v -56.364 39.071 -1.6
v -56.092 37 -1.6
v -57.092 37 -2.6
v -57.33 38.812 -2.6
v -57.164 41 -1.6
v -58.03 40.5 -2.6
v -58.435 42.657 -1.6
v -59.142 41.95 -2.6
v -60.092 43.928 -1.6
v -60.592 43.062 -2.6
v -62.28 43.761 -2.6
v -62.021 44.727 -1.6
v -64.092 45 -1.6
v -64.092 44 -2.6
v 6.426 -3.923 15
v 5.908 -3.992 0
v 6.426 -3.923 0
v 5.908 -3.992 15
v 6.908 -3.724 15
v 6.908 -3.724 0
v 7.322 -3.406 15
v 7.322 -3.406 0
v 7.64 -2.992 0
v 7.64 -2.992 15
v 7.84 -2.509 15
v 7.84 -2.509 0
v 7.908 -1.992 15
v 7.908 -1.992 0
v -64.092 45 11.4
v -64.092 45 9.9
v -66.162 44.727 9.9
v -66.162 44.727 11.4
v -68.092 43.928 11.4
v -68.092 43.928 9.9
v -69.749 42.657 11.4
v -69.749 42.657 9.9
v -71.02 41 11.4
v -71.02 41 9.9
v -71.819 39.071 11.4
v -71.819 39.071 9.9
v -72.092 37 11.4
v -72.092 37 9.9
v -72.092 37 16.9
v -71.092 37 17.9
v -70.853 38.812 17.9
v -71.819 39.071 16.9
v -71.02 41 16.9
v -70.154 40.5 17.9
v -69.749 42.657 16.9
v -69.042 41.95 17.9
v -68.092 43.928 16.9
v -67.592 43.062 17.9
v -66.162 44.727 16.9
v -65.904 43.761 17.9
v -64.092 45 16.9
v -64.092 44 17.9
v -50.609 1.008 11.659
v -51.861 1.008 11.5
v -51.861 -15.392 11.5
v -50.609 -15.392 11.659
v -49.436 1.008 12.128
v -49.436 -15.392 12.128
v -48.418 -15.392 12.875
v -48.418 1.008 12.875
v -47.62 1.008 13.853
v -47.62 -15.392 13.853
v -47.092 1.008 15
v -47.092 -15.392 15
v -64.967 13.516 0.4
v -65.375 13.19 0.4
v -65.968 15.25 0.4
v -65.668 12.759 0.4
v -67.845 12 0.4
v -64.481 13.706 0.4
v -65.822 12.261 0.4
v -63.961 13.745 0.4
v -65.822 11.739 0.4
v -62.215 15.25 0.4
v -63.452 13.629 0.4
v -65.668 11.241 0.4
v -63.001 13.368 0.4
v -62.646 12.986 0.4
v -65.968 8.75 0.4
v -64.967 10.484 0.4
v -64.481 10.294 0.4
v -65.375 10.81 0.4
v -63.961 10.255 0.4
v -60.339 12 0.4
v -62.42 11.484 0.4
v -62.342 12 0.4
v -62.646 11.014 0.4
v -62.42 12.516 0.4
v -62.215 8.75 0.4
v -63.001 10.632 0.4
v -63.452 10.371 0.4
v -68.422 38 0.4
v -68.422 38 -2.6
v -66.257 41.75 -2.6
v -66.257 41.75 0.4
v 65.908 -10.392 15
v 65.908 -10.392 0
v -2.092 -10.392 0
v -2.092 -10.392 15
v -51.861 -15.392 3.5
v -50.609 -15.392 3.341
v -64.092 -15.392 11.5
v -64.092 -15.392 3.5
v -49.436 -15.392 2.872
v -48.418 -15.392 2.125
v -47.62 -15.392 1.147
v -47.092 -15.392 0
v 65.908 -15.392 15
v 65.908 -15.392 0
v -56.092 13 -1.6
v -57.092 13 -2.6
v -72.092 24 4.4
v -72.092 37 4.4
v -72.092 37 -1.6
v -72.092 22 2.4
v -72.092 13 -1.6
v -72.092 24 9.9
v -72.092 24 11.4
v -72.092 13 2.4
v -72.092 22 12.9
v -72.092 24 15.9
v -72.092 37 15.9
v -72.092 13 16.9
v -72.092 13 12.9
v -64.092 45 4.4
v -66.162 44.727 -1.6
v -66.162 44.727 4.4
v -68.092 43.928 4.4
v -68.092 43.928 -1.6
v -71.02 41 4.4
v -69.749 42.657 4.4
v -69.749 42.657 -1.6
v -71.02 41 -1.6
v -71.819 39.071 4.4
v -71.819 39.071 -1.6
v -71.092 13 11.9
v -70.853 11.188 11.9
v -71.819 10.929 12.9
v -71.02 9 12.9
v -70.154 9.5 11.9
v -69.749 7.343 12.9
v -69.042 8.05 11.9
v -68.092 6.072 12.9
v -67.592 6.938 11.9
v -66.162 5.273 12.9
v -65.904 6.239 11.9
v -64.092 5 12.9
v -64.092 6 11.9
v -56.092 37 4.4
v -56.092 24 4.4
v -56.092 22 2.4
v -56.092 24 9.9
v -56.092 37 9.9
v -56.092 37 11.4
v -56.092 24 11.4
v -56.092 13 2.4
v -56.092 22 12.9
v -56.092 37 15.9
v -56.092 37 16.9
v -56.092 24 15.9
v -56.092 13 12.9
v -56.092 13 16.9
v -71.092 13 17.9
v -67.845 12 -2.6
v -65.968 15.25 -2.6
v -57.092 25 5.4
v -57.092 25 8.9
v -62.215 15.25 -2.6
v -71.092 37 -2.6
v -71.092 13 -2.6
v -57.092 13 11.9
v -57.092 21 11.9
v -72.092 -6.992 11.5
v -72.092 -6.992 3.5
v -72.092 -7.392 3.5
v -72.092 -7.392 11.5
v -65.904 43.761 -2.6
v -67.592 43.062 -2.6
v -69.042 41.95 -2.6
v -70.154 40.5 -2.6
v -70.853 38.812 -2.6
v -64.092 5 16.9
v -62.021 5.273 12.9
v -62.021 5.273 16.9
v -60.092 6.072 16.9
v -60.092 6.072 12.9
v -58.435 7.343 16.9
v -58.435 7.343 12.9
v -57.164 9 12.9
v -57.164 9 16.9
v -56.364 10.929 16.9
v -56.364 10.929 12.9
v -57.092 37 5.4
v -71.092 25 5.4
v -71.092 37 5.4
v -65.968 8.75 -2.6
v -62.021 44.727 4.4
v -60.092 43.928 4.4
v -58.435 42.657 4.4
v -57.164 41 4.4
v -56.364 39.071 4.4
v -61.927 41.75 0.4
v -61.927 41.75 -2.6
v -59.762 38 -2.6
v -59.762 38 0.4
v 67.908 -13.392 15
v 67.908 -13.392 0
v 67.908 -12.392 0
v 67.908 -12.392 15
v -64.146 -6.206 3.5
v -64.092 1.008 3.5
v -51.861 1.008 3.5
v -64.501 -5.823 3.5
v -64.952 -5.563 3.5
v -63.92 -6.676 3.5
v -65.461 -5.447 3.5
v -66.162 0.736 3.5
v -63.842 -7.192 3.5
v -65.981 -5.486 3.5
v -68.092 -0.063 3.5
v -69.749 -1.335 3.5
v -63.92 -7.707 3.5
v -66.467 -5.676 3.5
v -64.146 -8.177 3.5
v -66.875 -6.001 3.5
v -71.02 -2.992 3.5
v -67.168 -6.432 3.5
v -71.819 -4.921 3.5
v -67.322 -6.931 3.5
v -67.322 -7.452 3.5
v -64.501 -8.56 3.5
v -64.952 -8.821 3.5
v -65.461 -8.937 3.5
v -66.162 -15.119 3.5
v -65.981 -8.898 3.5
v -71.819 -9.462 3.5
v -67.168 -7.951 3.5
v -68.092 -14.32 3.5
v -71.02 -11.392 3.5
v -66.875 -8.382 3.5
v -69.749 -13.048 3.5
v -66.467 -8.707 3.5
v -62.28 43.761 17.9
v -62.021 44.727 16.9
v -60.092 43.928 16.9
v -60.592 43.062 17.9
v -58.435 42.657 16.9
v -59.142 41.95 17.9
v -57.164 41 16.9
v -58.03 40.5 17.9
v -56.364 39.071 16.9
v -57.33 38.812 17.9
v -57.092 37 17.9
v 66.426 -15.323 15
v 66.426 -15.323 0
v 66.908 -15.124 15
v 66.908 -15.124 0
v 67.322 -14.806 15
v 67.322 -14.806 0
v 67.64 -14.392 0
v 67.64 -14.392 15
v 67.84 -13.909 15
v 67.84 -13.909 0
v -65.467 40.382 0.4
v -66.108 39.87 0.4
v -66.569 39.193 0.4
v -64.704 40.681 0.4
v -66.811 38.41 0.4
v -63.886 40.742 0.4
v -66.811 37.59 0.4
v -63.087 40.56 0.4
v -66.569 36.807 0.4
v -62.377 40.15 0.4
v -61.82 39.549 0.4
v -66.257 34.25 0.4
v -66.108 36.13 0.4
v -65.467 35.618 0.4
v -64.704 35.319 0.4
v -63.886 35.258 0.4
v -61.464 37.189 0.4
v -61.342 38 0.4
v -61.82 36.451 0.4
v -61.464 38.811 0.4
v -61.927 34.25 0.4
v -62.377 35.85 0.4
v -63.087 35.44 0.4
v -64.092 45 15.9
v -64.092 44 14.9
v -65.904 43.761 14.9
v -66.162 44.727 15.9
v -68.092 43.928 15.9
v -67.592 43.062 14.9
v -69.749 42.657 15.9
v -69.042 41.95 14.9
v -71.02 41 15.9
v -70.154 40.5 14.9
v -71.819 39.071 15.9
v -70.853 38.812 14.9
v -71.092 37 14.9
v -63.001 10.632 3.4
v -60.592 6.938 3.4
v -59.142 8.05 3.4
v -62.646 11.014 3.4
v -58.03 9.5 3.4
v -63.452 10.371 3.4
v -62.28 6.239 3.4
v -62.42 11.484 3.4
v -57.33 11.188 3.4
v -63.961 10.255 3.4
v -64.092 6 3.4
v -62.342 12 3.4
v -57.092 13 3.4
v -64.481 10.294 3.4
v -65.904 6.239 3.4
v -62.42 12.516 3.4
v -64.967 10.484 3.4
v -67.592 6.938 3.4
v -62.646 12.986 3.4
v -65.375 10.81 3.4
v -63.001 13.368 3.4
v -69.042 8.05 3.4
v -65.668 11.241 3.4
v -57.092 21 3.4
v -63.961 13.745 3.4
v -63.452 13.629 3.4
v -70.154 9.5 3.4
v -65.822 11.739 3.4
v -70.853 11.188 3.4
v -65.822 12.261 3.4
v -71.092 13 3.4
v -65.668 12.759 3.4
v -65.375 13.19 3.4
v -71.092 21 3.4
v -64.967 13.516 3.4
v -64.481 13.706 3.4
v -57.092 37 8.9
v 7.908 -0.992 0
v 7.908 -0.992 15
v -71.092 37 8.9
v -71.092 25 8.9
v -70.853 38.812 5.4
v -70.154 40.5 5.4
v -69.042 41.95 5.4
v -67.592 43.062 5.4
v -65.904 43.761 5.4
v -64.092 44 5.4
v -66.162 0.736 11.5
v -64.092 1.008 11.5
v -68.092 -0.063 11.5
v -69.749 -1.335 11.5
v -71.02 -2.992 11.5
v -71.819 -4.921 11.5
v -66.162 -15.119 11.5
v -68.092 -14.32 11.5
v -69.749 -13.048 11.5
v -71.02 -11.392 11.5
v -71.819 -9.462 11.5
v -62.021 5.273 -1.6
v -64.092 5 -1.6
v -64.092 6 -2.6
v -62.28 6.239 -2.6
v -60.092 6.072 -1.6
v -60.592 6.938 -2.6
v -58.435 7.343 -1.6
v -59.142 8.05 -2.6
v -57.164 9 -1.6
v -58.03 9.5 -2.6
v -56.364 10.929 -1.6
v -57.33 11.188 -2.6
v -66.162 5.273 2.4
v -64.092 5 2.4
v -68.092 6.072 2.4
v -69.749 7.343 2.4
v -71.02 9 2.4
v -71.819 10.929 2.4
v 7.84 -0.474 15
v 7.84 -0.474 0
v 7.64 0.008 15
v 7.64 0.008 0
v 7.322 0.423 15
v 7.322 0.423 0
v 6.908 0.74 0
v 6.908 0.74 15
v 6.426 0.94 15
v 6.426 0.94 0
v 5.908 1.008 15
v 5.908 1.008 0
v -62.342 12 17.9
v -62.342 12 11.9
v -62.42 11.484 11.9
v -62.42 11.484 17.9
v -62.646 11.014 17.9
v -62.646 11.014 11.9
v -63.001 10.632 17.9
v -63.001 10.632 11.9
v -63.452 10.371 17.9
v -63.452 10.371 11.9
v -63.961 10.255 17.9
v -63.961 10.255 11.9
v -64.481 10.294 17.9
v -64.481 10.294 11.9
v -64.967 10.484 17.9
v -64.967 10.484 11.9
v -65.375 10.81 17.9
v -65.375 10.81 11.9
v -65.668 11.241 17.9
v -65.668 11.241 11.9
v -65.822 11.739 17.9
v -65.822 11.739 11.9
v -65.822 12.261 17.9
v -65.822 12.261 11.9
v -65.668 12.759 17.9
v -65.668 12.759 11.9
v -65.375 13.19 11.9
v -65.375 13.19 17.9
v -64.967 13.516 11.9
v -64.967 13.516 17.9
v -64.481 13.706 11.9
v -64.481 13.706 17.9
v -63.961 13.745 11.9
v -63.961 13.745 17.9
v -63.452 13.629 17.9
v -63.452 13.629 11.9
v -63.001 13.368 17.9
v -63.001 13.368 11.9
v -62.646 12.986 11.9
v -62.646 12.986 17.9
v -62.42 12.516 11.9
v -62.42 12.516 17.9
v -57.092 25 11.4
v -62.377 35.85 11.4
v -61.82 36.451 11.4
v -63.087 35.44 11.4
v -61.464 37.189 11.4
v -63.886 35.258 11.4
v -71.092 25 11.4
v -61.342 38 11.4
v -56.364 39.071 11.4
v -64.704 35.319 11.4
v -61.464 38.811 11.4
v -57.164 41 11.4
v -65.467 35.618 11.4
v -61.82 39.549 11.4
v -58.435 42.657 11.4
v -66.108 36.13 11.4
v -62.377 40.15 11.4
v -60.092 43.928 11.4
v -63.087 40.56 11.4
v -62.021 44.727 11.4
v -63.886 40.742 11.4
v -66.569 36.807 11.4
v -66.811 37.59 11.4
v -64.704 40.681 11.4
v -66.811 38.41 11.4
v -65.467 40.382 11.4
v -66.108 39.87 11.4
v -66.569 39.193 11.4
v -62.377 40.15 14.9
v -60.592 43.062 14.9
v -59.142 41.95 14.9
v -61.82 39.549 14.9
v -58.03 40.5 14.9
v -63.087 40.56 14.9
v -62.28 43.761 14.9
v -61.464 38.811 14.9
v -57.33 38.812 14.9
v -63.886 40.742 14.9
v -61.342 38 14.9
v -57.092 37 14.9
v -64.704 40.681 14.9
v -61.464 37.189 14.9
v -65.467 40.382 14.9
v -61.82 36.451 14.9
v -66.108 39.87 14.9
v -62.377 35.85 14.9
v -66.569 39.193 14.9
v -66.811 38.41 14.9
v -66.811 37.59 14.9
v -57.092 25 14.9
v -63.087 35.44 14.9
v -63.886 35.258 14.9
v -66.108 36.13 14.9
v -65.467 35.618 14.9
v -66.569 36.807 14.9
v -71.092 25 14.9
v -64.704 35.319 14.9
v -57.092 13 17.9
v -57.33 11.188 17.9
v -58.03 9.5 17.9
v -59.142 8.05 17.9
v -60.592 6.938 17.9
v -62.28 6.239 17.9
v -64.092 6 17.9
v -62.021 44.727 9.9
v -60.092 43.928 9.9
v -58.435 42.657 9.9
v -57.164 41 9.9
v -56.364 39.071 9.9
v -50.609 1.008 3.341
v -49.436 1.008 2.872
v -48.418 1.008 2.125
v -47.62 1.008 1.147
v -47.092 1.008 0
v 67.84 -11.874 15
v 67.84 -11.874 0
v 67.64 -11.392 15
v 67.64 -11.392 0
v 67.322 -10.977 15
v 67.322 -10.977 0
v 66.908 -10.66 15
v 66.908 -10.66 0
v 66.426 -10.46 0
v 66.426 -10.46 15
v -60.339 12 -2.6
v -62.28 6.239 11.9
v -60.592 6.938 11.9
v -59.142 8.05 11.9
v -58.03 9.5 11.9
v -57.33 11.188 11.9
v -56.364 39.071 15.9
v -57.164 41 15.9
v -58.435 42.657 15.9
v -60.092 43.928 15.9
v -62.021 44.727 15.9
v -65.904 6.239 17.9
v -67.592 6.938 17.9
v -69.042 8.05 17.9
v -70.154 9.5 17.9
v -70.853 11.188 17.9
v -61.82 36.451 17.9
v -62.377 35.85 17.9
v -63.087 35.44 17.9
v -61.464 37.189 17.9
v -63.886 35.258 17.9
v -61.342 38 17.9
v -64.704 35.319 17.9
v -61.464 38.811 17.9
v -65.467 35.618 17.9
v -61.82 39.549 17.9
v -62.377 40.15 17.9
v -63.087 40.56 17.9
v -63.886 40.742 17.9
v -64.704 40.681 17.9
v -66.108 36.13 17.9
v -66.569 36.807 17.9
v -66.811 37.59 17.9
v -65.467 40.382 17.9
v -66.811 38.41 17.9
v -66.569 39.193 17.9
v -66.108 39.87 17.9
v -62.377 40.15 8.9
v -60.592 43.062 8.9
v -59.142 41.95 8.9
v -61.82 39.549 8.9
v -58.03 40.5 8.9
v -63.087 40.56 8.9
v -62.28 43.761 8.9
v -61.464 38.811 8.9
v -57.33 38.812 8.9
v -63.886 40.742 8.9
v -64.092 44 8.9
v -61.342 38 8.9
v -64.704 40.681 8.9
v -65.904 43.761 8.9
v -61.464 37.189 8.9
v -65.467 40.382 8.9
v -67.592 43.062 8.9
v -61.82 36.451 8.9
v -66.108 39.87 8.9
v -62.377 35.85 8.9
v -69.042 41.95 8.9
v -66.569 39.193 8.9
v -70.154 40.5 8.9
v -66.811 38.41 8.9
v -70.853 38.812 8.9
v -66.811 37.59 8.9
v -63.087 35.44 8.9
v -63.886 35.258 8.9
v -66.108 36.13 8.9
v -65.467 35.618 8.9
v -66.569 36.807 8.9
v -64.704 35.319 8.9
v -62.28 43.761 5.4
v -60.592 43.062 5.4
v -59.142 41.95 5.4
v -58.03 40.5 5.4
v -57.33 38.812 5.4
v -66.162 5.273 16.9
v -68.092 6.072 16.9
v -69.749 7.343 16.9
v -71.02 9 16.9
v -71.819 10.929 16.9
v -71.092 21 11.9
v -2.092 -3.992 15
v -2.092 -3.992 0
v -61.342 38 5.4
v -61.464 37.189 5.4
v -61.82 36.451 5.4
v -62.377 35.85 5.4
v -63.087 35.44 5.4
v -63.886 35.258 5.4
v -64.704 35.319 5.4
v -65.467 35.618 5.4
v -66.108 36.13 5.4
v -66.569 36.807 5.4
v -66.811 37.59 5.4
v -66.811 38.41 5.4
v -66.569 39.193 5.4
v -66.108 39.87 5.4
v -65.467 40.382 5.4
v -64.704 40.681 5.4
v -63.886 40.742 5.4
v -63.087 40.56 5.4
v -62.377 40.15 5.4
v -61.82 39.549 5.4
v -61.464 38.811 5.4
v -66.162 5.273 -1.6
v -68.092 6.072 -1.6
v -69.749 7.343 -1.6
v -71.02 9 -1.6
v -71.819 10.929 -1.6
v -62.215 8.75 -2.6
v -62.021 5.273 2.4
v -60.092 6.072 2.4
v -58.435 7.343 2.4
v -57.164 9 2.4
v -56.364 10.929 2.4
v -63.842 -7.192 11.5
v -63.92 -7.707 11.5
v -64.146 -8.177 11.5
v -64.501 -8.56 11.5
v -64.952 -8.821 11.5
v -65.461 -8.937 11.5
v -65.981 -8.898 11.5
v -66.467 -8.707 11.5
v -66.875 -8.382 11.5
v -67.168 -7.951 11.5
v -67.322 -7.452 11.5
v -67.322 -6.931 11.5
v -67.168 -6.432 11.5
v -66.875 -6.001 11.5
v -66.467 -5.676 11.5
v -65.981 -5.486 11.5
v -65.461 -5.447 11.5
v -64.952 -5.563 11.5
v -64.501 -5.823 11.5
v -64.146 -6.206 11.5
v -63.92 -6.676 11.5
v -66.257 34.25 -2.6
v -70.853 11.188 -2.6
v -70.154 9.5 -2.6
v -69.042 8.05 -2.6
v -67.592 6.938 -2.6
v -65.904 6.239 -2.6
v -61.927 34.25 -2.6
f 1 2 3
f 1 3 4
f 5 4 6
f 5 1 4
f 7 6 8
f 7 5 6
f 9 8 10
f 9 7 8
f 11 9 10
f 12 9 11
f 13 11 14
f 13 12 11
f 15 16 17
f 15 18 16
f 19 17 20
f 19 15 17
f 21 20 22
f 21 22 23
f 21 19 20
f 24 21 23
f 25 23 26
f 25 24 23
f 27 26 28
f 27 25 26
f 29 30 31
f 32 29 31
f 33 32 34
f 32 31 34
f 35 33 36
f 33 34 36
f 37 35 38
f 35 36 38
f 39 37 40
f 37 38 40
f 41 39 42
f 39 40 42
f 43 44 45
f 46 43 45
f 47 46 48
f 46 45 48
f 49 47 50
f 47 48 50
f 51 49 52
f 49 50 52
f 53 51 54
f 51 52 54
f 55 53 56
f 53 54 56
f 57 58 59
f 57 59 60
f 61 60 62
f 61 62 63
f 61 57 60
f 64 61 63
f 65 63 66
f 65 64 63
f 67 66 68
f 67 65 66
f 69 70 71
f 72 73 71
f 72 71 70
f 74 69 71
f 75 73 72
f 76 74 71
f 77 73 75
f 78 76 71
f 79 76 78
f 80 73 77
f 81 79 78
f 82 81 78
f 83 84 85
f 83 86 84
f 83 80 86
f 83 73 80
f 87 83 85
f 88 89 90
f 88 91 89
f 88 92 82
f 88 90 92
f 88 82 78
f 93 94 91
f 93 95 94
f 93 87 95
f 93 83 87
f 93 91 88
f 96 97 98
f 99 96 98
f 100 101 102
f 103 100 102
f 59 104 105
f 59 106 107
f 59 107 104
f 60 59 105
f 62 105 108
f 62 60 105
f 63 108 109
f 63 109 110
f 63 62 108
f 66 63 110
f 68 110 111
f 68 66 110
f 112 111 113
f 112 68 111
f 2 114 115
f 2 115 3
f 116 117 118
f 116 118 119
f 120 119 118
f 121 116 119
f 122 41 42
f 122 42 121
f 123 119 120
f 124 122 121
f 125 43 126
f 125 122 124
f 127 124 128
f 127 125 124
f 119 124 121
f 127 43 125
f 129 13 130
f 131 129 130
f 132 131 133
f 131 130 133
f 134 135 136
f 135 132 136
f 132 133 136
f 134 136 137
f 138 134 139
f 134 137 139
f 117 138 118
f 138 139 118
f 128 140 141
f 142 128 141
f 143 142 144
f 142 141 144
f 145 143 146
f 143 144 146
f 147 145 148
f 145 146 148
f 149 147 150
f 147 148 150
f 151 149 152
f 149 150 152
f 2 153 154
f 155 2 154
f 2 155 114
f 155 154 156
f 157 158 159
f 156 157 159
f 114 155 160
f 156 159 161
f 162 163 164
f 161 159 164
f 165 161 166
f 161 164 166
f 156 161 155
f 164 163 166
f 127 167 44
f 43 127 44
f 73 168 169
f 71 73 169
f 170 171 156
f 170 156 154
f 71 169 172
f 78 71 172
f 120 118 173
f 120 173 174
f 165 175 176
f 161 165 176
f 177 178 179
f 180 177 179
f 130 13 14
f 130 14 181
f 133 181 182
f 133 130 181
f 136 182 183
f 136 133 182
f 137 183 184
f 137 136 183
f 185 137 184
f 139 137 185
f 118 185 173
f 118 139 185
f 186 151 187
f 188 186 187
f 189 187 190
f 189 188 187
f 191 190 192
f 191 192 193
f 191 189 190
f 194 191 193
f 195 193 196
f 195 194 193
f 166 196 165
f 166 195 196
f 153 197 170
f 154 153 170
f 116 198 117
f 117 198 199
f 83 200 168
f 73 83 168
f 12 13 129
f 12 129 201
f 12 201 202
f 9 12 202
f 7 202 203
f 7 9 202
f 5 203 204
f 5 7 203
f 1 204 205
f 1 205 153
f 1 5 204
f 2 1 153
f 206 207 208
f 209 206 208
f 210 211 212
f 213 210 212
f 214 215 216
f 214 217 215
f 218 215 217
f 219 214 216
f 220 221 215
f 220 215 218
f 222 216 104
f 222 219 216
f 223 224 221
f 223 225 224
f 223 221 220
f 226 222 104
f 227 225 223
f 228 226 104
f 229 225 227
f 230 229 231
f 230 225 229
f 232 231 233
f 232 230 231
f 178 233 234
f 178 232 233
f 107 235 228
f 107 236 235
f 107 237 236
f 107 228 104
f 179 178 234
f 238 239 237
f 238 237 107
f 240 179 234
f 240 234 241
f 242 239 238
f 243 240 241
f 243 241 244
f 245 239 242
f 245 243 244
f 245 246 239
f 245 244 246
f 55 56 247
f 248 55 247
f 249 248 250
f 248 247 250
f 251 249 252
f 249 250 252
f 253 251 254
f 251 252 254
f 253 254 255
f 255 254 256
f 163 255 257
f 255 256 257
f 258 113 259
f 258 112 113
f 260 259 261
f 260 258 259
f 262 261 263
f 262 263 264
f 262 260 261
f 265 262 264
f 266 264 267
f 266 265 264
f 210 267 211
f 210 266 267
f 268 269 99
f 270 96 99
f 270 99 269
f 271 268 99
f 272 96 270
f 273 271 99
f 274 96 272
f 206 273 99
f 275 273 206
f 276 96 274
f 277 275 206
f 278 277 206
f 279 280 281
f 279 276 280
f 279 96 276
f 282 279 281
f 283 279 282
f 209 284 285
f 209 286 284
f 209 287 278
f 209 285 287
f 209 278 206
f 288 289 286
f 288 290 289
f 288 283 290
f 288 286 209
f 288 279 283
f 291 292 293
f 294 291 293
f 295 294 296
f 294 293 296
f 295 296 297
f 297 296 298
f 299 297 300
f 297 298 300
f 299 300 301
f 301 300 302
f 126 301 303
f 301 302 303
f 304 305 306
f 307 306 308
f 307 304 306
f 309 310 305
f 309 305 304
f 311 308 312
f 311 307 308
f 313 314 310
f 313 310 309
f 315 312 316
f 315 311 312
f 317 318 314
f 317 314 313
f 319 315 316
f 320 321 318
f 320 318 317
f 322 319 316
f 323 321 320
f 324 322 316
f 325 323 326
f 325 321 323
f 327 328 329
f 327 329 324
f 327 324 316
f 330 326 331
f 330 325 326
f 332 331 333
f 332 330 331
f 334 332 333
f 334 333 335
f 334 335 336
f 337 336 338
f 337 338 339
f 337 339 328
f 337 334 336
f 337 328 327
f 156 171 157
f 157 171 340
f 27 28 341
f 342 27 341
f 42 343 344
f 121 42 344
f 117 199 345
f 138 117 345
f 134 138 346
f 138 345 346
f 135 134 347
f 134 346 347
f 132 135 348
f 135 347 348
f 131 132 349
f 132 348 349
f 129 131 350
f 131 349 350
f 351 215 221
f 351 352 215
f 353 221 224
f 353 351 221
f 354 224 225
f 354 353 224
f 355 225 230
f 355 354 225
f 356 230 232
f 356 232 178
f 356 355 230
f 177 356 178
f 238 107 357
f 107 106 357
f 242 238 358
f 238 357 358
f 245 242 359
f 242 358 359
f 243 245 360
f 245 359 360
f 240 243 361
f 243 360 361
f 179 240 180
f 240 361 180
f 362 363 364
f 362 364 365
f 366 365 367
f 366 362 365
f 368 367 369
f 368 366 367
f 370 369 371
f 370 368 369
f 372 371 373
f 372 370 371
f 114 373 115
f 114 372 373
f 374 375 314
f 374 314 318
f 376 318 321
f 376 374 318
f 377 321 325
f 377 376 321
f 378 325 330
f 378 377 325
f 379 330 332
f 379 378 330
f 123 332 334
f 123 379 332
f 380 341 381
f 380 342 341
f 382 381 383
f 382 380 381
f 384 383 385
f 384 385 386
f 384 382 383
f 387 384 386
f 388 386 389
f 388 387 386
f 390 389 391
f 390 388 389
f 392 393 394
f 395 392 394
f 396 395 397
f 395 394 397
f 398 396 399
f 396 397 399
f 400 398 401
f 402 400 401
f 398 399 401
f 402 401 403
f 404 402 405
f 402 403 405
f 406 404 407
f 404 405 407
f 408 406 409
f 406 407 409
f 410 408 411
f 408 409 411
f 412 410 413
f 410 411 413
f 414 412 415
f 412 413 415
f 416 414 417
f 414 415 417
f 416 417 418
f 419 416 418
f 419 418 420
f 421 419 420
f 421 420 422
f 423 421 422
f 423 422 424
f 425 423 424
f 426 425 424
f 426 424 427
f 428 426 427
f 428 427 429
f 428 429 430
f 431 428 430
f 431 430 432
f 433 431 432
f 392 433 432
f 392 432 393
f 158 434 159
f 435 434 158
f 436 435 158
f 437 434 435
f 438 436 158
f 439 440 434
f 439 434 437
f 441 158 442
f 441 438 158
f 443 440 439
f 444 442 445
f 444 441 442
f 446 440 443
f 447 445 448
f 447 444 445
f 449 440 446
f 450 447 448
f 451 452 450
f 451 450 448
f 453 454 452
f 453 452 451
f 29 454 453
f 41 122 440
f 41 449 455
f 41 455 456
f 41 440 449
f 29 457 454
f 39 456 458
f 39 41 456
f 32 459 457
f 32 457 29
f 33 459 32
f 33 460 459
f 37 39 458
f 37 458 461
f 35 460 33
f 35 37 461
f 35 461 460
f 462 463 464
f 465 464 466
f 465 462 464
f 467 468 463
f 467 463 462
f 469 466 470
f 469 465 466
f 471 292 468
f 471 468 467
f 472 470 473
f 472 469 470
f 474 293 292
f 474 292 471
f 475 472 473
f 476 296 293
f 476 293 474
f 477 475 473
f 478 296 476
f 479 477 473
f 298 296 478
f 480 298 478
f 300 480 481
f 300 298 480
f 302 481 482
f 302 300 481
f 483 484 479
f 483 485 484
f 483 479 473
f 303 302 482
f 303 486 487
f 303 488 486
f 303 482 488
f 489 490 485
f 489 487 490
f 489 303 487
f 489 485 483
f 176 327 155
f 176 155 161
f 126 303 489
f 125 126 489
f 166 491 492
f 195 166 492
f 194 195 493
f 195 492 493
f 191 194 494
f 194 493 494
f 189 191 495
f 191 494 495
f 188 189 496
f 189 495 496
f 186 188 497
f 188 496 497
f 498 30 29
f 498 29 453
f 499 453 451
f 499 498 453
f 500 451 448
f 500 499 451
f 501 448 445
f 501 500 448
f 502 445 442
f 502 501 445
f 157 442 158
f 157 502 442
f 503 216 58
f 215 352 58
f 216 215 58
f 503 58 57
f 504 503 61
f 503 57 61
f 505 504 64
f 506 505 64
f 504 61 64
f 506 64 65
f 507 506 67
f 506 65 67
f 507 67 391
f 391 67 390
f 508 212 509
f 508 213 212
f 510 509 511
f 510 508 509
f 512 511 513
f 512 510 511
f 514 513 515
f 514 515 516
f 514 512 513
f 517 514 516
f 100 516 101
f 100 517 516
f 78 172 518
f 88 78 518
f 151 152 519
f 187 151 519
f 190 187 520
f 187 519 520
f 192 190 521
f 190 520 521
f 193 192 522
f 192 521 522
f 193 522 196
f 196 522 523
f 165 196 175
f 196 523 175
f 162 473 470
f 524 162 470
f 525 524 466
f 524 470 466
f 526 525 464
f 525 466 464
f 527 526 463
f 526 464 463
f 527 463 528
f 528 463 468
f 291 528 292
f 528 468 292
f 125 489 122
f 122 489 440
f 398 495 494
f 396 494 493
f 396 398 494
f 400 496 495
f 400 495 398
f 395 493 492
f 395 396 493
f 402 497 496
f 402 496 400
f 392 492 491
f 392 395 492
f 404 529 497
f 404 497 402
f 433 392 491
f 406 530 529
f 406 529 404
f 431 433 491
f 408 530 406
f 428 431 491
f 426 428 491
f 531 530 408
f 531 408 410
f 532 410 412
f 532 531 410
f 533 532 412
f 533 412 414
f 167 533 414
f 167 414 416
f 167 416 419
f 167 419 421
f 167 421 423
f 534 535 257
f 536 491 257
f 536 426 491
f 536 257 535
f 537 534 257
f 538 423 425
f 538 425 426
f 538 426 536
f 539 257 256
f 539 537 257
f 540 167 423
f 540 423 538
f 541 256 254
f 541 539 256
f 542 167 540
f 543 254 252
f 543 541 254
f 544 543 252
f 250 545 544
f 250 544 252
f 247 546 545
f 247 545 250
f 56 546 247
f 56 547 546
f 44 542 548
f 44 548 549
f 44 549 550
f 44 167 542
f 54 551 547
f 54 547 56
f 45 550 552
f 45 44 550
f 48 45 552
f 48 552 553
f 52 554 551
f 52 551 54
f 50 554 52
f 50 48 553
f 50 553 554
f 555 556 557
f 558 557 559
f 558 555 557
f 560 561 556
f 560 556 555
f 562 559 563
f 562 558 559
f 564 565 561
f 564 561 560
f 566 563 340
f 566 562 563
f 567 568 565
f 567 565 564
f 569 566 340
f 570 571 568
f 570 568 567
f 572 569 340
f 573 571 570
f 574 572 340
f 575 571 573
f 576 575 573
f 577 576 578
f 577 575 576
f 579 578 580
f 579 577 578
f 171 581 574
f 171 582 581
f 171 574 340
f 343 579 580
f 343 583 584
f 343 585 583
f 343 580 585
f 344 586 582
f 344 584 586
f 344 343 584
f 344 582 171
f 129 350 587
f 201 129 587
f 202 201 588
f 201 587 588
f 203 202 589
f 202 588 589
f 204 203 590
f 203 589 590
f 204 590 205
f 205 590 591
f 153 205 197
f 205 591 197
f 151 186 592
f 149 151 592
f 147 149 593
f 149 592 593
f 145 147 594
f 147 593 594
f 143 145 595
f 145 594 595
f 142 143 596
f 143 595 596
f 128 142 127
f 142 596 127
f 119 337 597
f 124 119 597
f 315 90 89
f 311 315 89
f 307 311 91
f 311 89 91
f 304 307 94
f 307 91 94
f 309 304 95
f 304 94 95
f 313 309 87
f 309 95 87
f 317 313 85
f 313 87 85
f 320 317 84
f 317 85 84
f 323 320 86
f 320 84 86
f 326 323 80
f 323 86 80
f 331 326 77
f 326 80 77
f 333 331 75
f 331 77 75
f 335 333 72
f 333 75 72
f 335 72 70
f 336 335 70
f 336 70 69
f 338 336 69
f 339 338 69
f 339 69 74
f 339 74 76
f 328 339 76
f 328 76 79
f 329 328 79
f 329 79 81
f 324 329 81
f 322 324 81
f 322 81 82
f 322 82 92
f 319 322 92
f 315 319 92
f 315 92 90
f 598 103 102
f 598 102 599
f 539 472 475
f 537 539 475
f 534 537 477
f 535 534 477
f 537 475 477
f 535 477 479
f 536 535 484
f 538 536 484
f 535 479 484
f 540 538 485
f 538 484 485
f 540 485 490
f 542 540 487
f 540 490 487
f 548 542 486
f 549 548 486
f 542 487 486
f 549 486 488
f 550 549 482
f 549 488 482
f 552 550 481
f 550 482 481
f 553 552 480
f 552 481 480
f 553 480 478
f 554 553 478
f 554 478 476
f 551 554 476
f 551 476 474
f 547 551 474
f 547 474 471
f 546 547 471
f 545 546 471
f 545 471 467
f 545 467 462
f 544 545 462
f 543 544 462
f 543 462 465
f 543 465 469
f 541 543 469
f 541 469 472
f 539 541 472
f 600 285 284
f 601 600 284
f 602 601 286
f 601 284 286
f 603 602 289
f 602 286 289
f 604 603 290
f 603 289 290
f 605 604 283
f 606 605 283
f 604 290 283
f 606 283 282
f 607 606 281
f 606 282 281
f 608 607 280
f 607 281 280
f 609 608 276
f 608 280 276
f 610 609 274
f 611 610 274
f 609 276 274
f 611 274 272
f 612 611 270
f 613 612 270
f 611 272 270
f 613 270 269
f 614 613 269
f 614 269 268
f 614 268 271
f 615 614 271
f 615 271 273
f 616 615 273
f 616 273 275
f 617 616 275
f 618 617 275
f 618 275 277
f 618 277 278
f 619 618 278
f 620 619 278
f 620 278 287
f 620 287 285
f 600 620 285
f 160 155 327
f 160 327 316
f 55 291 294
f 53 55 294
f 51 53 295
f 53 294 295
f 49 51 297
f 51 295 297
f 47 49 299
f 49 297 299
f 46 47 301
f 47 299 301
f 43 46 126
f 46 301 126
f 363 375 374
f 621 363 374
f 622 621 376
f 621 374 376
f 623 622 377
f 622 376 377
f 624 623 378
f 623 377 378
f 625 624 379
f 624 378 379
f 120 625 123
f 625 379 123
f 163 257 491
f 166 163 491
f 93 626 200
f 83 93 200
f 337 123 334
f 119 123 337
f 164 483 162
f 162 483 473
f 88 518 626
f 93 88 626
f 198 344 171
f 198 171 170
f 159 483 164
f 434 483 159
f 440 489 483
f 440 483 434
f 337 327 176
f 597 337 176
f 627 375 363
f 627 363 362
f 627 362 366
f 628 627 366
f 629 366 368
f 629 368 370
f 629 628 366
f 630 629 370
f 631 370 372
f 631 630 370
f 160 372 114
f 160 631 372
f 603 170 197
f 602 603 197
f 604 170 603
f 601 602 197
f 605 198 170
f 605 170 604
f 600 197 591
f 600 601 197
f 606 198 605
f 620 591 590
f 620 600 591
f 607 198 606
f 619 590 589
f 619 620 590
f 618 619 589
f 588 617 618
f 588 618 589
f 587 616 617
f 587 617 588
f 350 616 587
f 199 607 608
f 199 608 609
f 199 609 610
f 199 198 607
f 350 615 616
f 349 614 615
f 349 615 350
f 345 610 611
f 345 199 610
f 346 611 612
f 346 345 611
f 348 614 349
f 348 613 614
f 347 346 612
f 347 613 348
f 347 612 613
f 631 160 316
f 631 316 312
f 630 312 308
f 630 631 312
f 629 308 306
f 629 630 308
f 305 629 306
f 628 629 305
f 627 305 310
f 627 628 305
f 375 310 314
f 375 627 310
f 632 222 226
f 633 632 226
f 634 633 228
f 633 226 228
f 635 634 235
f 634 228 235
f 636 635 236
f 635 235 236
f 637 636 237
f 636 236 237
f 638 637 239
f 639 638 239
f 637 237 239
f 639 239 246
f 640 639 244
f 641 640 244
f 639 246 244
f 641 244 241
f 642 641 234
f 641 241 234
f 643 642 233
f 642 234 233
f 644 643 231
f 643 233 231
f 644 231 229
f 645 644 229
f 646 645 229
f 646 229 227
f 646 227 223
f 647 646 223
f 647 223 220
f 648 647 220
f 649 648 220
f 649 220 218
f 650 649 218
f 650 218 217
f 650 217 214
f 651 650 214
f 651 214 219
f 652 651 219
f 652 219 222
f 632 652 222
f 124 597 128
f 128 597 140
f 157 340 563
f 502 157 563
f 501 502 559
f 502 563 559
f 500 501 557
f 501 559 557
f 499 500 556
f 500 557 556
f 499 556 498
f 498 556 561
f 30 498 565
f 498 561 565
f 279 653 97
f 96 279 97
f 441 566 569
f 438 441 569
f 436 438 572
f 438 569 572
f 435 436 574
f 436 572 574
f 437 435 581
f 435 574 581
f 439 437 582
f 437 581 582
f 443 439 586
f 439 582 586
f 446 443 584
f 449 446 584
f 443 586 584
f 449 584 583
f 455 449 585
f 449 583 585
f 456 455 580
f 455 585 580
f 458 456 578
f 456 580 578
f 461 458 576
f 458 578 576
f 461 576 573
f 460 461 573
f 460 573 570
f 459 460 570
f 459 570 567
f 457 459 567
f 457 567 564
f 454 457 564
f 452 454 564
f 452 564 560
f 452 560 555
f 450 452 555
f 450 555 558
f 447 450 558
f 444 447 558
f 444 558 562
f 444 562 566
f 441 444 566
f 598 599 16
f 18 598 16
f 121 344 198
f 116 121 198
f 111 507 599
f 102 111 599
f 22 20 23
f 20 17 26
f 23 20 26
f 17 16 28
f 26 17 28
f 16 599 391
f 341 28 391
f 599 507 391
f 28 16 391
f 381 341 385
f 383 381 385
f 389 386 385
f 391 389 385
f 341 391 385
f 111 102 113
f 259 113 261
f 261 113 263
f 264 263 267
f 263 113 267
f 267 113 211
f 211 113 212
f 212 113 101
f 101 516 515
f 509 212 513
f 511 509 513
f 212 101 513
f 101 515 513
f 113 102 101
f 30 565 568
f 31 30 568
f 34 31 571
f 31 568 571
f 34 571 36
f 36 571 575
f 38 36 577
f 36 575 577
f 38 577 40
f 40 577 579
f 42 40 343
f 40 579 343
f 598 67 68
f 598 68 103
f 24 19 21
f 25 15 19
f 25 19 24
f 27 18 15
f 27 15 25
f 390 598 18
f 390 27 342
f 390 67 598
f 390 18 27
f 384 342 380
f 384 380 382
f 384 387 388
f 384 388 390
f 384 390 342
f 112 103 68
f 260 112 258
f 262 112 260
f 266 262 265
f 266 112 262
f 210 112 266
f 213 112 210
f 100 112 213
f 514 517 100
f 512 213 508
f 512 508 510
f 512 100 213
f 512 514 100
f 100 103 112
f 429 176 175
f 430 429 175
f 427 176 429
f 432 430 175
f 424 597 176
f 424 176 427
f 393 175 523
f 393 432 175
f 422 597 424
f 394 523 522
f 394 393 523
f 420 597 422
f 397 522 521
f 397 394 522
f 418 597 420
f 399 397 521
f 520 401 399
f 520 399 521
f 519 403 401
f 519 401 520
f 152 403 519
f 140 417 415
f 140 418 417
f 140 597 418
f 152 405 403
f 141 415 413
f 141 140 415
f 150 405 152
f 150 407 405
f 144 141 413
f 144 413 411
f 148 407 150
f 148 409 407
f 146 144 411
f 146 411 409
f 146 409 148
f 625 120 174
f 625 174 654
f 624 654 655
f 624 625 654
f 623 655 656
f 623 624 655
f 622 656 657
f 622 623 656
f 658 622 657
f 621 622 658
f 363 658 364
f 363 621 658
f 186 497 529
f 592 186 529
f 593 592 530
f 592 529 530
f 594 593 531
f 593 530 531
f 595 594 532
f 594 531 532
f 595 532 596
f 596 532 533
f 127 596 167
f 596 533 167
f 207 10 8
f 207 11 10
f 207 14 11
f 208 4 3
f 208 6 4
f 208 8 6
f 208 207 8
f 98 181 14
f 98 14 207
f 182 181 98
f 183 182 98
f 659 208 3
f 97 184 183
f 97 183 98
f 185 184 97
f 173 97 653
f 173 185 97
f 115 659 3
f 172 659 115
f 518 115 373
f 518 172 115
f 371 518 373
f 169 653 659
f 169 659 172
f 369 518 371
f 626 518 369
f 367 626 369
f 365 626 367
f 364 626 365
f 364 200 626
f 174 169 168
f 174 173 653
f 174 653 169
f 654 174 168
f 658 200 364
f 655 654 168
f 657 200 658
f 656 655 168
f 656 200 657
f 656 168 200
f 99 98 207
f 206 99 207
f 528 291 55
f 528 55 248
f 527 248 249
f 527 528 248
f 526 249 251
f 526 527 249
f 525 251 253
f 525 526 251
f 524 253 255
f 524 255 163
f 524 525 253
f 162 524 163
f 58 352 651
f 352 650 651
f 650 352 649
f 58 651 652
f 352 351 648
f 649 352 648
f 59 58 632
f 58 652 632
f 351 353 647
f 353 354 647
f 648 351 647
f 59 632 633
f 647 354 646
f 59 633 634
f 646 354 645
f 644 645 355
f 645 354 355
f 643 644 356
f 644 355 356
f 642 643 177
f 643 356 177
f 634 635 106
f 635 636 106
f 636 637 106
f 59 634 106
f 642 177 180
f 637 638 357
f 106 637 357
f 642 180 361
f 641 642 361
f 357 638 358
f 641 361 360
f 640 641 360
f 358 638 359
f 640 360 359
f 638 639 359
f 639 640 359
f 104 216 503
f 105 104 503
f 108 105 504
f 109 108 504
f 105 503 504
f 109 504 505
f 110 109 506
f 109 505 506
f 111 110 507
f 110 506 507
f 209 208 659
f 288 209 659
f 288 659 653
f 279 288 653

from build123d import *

# Parameters (mm, degrees)
F1_DEPTH     = 15
F3_DEPTH     = 16
F5_R         = 7.99999
F4_R         = 2.75
F4_R_2       = 1.75
F6_DEPTH     = 25
F9_R         = 2
F10_W        = 16.4
F10_H        = 3.5
F11_DEPTH    = 25
F12_R        = 8
F13_R        = 1.75
F14_DEPTH    = 25
F15_T1_DEPTH = 16.4
F16_R        = 2.75
F16_R_2      = 1.75
F17_DEPTH    = 3
F18_SIZE     = 1


# Not quite as in the source:
# - a fillet or chamfer that OpenCascade refuses, or shapes differently, is made with other operations: its cross-section is extruded or revolved along the edge and cut away or added
# - a fillet or chamfer is up to 0.001 mm smaller than in the source, because OpenCascade refuses the exact size
# - a feature of the source that left no trace in its solid (it failed there, or was rolled back) is left out
# - a feature names something its author has since deleted; it is built from what else it names


with BuildPart() as f1:
    # F0 (on Top) → F1 (new body)
    with BuildSketch(Plane.XY):
        Polygon((-2.0918029547, -10.391625925), (-2.0918029547, -3.991625925), (7.9081970453, -3.991625925), (7.9081970453, 1.008374075), (-2.0918029547, 1.008374075), (-72.0918029547, 1.008374075), (-72.0918029547, -15.391625925), (-2.0918029547, -15.391625925), (67.9081970453, -15.391625925), (67.9081970453, -10.391625925), align=None)
    extrude(amount=F1_DEPTH)

    # F9
    f9_edges = [f1.edges().sort_by_distance(p)[0] for p in [
        (7.908197, 1.008374, 7.5),
        (67.908197, -10.391626, 7.5),
        (67.908197, -15.391626, 7.5),
        (7.908197, -3.991626, 7.5),
    ]]
    fillet(f9_edges, radius=F9_R)

    # F10 (on face) → F11 (cut)
    with BuildSketch(Plane(origin=(-72.0918029547, 0, 0), x_dir=(0, -1, 0), z_dir=(-1, 0, 0))):
        with Locations((7.191625925, 1.75)):
            Rectangle(F10_W, F10_H)
        with Locations((7.191625925, 13.25)):
            Rectangle(F10_W, F10_H)
    extrude(amount=-F11_DEPTH, mode=Mode.SUBTRACT)

    # F12
    f12_edges = [f1.edges().sort_by_distance(p)[0] for p in [
        (-72.091803, 1.008374, 7.5),
        (-72.091803, -15.391626, 7.5),
    ]]
    fillet(f12_edges, radius=F12_R)

    # F13 (on face) → F14 (cut)
    with BuildSketch(Plane(origin=(0, 0, 3.5), x_dir=(1, 0, 0), z_dir=(0, 0, -1))):
        with Locations((-65.5918029547, 7.191625925)):
            Circle(F13_R)
    extrude(amount=-F14_DEPTH, mode=Mode.SUBTRACT)

    # F15: fillet of radius 5 on 2 edges, made by hand

    # F15_s2 → F15_t1 (join)
    with BuildSketch(Plane.XZ.offset(-1.008374075)):
        with BuildLine():
            ThreePointArc((-51.8614989618, 3.5), (-48.9034590702, 2.5311288741), (-47.0918029547, 0))
            Line((-47.0918029547, 0), (-47.0918029547, 3.5))
            Line((-47.0918029547, 3.5), (-51.8614989618, 3.5))
        make_face()
        with BuildLine():
            ThreePointArc((-51.8614989618, 11.5), (-48.9034590702, 12.4688711259), (-47.0918029547, 15))
            Line((-47.0918029547, 15), (-47.0918029547, 11.5))
            Line((-47.0918029547, 11.5), (-51.8614989618, 11.5))
        make_face()
    extrude(amount=F15_T1_DEPTH)


with BuildPart() as f3:
    # F2 (on face) → F3 (new body)
    with BuildSketch(Plane(origin=(-72.0918029547, 0, 0), x_dir=(0, -1, 0), z_dir=(-1, 0, 0))):
        Polygon((-25.0802974196, -2.6), (-5, -2.6), (-5, 3.4), (-21, 3.4), (-21, 11.9), (-5, 11.9), (-5, 17.9), (-25, 17.9), (-45, 17.9), (-45, 14.9), (-25, 14.9), (-25, 11.4), (-45, 11.4), (-45, 8.9), (-25, 8.9), (-25, 5.4), (-45, 5.4), (-45, -2.6), align=None)
    extrude(amount=-F3_DEPTH)

    # F5 (radius 8 in the source; OpenCascade refuses exactly that, so slightly less here)
    f5_edges = [f3.edges().sort_by_distance(p)[0] for p in [
        (-56.091803, 45, 1.4),
        (-56.091803, 45, 10.15),
        (-56.091803, 45, 16.4),
        (-72.091803, 45, 1.4),
        (-72.091803, 45, 10.15),
        (-72.091803, 45, 16.4),
        (-72.091803, 5, 0.4),
        (-72.091803, 5, 14.9),
        (-56.091803, 5, 0.4),
        (-56.091803, 5, 14.9),
    ]]
    fillet(f5_edges, radius=F5_R)

    # F4 (on face) → F6 (cut)
    with BuildSketch(Plane(origin=(0, 0, -2.6), x_dir=(1, 0, 0), z_dir=(0, 0, -1))):
        with Locations((-64.0918029547, -38)):
            Circle(F4_R)
        with Locations((-64.0918029547, -12)):
            Circle(F4_R_2)
    extrude(amount=-F6_DEPTH, mode=Mode.SUBTRACT)

    # F16 (on face) → F17 (cut)
    with BuildSketch(Plane(origin=(0, 0, -2.6), x_dir=(1, 0, 0), z_dir=(0, 0, -1))):
        Polygon((-61.9267394452, -34.25), (-66.2568664641, -34.25), (-68.4219299736, -38), (-66.2568664641, -41.75), (-61.9267394452, -41.75), (-59.7616759358, -38), align=None)
        with Locations((-64.0918029547, -38)):
            Circle(F16_R, mode=Mode.SUBTRACT)
        Polygon((-62.2154145798, -8.75), (-65.9681913295, -8.75), (-67.8445797044, -12), (-65.9681913295, -15.25), (-62.2154145798, -15.25), (-60.3390262049, -12), align=None)
        with Locations((-64.0918029547, -12)):
            Circle(F16_R_2, mode=Mode.SUBTRACT)
    extrude(amount=-F17_DEPTH, mode=Mode.SUBTRACT)

    # F18
    f18_edges = [f3.edges().sort_by_distance(p)[0] for p in [
        (-72.091803, 25, 17.9),
        (-72.091803, 25, -2.6),
        (-72.091803, 31.000005, 5.4),
        (-72.091803, 31.000005, 8.9),
        (-72.091803, 31.000005, 14.9),
        (-72.091803, 16.999995, 11.9),
        (-72.091803, 21, 7.65),
        (-72.091803, 16.999995, 3.4),
        (-56.091803, 21, 7.65),
        (-56.091803, 25, 7.15),
        (-56.091803, 25, 13.15),
        (-72.091803, 25, 7.15),
        (-72.091803, 25, 13.15),
        (-64.091803, 45, -2.6),
        (-69.74866, 42.656857, -2.6),
        (-58.434946, 42.656857, -2.6),
        (-56.091803, 25, -2.6),
        (-69.74866, 7.343143, -2.6),
        (-58.434946, 7.343143, -2.6),
        (-64.091803, 5, -2.6),
        (-64.091803, 45, 5.4),
        (-69.74866, 42.656857, 5.4),
        (-58.434946, 42.656857, 5.4),
        (-56.091803, 31.000005, 5.4),
        (-56.091803, 16.999995, 3.4),
        (-56.091803, 31.000005, 8.9),
        (-56.091803, 16.999995, 11.9),
        (-56.091803, 25, 17.9),
        (-56.091803, 31.000005, 14.9),
        (-69.74866, 7.343143, 3.4),
        (-58.434946, 7.343143, 3.4),
        (-64.091803, 5, 3.4),
        (-64.091803, 45, 8.9),
        (-69.74866, 42.656857, 8.9),
        (-58.434946, 42.656857, 8.9),
        (-64.091803, 5, 11.9),
        (-69.74866, 7.343143, 11.9),
        (-58.434946, 7.343143, 11.9),
        (-69.74866, 7.343143, 17.9),
        (-64.091803, 5, 17.9),
        (-58.434946, 7.343143, 17.9),
        (-69.74866, 42.656857, 17.9),
        (-58.434946, 42.656857, 17.9),
        (-64.091803, 45, 17.9),
        (-69.74866, 42.656857, 14.9),
        (-64.091803, 45, 14.9),
        (-58.434946, 42.656857, 14.9),
    ]]
    chamfer(f18_edges, length=F18_SIZE)


solid = Compound([f1.part, f3.part])
